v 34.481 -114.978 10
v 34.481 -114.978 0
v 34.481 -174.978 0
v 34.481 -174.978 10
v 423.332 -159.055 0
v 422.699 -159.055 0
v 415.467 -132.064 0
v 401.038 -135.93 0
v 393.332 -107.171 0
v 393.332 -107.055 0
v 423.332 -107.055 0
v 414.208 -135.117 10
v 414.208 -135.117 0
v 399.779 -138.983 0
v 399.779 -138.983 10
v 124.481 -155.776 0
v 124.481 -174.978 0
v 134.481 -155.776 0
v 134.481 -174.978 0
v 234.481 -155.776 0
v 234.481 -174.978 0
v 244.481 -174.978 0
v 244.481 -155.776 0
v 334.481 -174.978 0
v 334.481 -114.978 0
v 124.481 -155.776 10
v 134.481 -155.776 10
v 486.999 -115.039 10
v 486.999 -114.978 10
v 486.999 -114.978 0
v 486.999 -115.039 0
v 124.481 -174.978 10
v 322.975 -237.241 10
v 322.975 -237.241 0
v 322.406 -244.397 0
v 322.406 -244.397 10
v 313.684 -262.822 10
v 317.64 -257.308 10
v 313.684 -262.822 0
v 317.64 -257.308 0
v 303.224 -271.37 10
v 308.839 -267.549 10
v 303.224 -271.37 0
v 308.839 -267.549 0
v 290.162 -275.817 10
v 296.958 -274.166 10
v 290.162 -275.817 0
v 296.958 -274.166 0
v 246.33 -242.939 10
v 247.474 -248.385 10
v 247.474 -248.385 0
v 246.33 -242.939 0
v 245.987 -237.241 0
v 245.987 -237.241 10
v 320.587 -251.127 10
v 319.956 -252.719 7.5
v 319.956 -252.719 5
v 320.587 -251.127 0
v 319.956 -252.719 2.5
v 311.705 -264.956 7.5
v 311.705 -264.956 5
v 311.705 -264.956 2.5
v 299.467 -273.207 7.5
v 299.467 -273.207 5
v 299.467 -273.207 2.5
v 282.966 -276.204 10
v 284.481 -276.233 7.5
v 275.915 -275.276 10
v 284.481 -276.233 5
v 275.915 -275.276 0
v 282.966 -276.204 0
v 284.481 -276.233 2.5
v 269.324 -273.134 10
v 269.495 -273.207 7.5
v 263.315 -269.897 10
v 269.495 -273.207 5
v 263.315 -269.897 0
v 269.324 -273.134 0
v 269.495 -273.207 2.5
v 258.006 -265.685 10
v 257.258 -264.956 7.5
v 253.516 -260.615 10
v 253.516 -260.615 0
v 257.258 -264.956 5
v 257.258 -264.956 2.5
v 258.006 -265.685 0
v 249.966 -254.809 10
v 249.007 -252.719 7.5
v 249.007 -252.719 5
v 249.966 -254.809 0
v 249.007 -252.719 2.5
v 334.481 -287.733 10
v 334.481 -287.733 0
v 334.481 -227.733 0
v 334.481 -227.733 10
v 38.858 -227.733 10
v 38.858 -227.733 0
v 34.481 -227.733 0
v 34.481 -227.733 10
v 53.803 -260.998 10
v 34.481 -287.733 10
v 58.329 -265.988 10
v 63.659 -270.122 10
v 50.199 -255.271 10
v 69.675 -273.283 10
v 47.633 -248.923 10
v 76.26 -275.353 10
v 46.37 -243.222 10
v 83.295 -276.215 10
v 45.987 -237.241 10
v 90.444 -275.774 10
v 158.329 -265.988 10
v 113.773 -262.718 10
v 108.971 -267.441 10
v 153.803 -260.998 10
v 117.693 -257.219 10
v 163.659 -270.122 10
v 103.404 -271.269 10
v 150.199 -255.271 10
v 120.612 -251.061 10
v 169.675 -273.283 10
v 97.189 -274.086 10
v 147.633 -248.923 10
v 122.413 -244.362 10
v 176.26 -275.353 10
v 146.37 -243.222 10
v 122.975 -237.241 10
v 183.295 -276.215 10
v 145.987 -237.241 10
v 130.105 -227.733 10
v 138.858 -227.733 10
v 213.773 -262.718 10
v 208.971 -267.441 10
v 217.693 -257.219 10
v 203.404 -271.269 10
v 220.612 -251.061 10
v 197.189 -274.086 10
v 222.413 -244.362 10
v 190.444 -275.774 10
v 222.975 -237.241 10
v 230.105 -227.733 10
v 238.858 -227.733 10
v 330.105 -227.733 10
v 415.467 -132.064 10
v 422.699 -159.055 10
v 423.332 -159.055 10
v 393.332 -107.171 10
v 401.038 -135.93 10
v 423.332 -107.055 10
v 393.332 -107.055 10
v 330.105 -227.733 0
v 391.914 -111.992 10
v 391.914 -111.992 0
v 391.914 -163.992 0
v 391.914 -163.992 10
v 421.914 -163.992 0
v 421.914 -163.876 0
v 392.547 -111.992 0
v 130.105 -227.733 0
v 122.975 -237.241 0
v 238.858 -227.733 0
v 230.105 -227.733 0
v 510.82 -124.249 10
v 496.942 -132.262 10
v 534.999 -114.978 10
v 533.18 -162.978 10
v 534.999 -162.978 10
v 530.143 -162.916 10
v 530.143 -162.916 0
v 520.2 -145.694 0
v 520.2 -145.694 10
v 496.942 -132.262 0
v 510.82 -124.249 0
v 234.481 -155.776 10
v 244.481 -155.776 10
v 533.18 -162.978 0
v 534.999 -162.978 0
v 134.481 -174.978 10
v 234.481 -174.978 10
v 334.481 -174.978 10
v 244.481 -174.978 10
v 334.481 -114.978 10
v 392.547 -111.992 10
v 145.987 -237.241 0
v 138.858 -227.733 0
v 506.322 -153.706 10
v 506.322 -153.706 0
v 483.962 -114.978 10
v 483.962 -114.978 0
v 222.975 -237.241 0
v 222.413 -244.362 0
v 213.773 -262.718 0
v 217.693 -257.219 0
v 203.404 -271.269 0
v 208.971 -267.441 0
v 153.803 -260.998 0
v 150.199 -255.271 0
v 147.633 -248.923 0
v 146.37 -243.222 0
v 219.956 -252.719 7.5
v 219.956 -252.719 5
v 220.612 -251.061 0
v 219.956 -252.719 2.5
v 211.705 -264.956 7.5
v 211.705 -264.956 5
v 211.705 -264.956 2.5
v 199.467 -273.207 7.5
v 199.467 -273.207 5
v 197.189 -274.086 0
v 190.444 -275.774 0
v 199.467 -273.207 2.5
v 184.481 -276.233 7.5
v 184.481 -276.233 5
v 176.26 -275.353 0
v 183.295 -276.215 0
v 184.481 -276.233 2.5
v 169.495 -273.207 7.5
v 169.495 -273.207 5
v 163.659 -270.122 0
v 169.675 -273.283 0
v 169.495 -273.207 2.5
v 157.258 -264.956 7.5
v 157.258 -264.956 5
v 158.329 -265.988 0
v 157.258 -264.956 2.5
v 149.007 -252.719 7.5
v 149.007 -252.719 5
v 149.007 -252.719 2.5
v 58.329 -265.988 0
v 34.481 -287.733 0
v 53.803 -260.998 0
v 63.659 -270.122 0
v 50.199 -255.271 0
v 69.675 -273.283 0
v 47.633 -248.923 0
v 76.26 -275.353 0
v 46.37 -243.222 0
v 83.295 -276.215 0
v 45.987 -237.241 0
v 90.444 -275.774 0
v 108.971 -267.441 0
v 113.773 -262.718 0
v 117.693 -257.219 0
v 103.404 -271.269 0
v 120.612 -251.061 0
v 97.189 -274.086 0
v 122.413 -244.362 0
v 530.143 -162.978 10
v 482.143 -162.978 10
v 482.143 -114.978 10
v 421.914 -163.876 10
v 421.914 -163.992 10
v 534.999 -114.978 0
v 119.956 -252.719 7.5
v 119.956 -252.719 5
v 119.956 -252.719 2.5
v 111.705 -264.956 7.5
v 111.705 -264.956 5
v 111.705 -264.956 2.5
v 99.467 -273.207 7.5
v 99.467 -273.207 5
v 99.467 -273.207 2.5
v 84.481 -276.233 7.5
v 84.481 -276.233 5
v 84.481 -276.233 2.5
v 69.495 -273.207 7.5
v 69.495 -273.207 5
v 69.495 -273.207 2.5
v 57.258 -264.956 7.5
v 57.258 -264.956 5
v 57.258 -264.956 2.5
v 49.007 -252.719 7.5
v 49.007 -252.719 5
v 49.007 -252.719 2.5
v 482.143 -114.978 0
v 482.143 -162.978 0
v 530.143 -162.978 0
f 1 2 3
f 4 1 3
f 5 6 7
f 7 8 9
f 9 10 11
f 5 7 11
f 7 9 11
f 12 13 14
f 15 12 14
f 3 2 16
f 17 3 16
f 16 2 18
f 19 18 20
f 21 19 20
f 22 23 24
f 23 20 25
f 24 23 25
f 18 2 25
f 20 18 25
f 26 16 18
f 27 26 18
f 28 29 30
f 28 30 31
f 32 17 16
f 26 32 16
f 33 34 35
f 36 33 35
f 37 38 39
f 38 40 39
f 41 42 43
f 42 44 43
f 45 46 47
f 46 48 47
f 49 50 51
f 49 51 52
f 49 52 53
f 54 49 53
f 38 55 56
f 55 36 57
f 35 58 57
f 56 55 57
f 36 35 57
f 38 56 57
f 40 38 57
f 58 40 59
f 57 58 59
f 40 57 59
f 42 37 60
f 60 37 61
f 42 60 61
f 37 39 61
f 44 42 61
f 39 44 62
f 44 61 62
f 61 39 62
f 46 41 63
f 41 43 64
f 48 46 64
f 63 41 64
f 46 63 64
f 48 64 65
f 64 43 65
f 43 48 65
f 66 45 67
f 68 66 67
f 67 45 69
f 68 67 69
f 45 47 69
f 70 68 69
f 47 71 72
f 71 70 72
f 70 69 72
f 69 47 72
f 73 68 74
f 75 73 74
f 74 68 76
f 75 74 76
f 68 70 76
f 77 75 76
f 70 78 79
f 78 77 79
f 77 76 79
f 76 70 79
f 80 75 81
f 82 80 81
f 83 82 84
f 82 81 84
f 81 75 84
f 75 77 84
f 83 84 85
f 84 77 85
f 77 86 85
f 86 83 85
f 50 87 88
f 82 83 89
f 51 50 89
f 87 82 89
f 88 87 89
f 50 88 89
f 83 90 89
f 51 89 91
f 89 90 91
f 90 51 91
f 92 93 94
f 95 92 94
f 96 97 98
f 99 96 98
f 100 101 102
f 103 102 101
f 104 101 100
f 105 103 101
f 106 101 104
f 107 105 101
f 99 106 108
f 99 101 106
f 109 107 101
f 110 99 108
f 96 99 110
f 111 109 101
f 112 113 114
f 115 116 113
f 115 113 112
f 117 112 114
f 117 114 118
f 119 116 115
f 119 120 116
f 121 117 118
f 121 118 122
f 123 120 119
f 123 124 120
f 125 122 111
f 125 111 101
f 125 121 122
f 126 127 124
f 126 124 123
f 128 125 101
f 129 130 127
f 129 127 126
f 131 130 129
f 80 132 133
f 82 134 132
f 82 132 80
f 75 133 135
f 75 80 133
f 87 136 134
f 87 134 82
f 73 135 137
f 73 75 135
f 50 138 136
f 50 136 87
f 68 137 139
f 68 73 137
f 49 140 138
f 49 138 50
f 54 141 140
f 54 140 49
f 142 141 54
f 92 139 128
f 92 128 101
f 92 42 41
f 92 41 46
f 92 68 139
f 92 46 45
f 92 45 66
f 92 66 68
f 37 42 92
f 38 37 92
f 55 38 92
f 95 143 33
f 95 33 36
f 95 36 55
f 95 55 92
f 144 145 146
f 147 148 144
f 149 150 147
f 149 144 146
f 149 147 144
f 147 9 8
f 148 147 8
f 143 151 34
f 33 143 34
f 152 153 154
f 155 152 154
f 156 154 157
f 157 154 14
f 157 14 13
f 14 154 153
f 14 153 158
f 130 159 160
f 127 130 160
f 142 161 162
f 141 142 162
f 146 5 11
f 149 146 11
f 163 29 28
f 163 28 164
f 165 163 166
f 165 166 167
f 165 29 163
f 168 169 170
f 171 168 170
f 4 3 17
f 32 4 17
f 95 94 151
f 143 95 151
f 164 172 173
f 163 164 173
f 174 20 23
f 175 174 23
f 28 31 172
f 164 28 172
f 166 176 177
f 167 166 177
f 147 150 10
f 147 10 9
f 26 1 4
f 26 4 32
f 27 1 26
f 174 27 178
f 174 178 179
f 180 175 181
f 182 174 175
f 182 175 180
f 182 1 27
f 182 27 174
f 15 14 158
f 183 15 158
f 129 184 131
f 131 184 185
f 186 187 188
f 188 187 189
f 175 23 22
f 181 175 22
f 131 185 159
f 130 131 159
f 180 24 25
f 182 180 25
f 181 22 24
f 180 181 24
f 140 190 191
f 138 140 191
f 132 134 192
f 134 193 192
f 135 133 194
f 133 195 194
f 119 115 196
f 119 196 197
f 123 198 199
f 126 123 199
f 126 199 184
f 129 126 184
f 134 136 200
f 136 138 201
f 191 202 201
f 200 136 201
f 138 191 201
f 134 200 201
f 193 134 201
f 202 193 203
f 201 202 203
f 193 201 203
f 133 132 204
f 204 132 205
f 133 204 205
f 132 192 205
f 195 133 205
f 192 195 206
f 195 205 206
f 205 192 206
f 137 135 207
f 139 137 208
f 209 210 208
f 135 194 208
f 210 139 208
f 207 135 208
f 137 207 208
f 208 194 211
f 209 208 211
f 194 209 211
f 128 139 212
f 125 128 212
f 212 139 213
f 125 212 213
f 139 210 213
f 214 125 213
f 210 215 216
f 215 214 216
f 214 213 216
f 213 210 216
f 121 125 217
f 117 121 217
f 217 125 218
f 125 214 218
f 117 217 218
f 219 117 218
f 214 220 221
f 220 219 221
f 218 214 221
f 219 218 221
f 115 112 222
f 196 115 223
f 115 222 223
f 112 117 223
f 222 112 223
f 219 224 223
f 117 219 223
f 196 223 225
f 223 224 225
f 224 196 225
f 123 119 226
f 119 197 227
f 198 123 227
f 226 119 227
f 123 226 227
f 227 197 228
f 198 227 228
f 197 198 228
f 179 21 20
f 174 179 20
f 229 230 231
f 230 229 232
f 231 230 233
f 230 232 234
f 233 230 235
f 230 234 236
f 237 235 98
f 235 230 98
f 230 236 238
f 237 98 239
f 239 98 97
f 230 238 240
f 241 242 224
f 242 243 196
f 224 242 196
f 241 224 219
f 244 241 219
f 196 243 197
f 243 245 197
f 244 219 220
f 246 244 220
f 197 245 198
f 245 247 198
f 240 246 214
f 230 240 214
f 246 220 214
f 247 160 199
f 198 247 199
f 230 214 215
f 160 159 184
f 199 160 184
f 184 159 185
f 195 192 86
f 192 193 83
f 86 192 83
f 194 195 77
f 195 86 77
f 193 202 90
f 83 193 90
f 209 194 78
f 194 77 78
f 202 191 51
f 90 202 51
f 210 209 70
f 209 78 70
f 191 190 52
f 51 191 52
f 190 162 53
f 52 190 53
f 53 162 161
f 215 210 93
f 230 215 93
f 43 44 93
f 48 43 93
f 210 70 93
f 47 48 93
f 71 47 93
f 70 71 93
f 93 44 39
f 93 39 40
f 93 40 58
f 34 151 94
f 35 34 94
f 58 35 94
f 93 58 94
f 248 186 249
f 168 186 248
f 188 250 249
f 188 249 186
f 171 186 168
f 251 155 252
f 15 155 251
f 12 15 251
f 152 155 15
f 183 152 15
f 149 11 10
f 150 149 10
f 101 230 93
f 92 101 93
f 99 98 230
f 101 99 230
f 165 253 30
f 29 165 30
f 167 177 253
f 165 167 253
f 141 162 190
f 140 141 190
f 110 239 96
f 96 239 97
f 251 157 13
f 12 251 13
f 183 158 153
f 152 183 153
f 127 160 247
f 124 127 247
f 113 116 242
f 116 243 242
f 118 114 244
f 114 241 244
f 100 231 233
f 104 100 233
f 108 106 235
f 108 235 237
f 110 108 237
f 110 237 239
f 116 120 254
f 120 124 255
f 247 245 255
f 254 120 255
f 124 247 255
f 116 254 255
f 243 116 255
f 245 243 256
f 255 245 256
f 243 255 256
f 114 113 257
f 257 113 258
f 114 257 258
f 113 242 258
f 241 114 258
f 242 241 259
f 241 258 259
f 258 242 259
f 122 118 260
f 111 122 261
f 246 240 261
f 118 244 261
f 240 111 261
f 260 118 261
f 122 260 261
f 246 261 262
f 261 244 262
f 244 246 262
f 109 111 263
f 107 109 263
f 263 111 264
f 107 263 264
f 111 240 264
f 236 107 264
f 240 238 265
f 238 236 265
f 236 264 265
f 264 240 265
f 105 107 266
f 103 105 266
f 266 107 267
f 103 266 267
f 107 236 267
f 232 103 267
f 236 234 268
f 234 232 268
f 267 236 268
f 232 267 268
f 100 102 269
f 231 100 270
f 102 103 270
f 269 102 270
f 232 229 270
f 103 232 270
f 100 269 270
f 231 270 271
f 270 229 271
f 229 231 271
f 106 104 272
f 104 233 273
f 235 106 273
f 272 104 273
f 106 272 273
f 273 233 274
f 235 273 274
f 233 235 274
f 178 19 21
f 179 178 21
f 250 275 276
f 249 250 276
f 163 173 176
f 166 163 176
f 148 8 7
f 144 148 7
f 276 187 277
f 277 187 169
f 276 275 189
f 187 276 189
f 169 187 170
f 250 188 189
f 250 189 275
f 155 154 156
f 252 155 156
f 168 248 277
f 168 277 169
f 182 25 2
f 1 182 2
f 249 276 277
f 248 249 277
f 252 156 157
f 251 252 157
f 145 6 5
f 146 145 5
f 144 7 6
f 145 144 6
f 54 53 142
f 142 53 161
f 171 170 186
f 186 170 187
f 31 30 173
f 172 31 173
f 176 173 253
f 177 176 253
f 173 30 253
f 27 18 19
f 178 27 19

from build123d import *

# Parameters (mm, degrees)
BOSS_EXTRU_1_DEPTH   = 10
BOSS_EXTRU_1_2_DEPTH = 10
BOSS_EXTRU_1_3_DEPTH = 10
BOSS_EXTRU_1_4_DEPTH = 10
BOSS_EXTRU_1_5_DEPTH = 10
BOSS_EXTRU_1_6_DEPTH = 10


with BuildPart() as part:
    # Model → Boss.-Extru.1 (new body)
    with BuildSketch(Plane.XY):
        with BuildLine():
            Line((245.987396918, -237.241344783), (238.857836405, -227.732795114))
            Line((238.857836405, -227.732795114), (230.104537794, -227.732795114))
            Line((230.104537794, -227.732795114), (222.97495575, -237.241366315))
            add(Edge.make_bspline(
                [(222.97495575, -237.241366315), (222.977001275, -237.405180605), (222.981178453, -237.568499663), (222.981178453, -237.732809186)],
                knots=[7, 7, 7, 7, 8, 8, 8, 8], degree=3))
            add(Edge.make_bspline(
                [(222.981178453, -237.732809186), (222.981178453, -258.995766271), (205.744138421, -276.232806304), (184.481181335, -276.232806304)],
                knots=[8, 8, 8, 8, 9, 9, 9, 9], degree=3))
            add(Edge.make_bspline(
                [(184.481181335, -276.232806304), (163.21822425, -276.232806304), (145.981184218, -258.995766271), (145.981184218, -237.732809186)],
                knots=[9, 9, 9, 9, 10, 10, 10, 10], degree=3))
            add(Edge.make_bspline(
                [(145.981184218, -237.732809186), (145.981184218, -237.568499663), (145.985361396, -237.405180605), (145.987406921, -237.241344783)],
                knots=[10, 10, 10, 10, 11, 11, 11, 11], degree=3))
            Line((145.987406921, -237.241344783), (138.857846408, -227.732795114))
            Line((138.857846408, -227.732795114), (130.104547797, -227.732795114))
            Line((130.104547797, -227.732795114), (122.974965752, -237.241366315))
            add(Edge.make_bspline(
                [(122.974965752, -237.241366315), (122.977011278, -237.405180605), (122.981188456, -237.568499663), (122.981188456, -237.732809186)],
                knots=[14, 14, 14, 14, 15, 15, 15, 15], degree=3))
            add(Edge.make_bspline(
                [(122.981188456, -237.732809186), (122.981188456, -258.995766271), (105.744148424, -276.232806304), (84.481191338, -276.232806304)],
                knots=[15, 15, 15, 15, 16, 16, 16, 16], degree=3))
            add(Edge.make_bspline(
                [(84.481191338, -276.232806304), (63.218212721, -276.232806304), (45.981172689, -258.995766271), (45.981172689, -237.732809186)],
                knots=[16, 16, 16, 16, 17, 17, 17, 17], degree=3))
            add(Edge.make_bspline(
                [(45.981172689, -237.732809186), (45.981172689, -237.568478131), (45.985349867, -237.405180605), (45.987395393, -237.241344783)],
                knots=[17, 17, 17, 17, 18, 18, 18, 18], degree=3))
            Line((45.987395393, -237.241344783), (38.85783488, -227.732795114))
            Line((38.85783488, -227.732795114), (34.481185574, -227.732795114))
            Line((34.481185574, -227.732795114), (34.481185574, -287.732793419))
            Line((34.481185574, -287.732793419), (334.481177097, -287.732793419))
            Line((334.481177097, -287.732793419), (334.481177097, -227.732795114))
            Line((334.481177097, -227.732795114), (330.104570855, -227.732795114))
            Line((330.104570855, -227.732795114), (322.974945747, -237.241366315))
            add(Edge.make_bspline(
                [(322.974945747, -237.241366315), (322.977012804, -237.405180605), (322.981189982, -237.568499663), (322.981189982, -237.732809186)],
                knots=[0, 0, 0, 0, 1, 1, 1, 1], degree=3))
            add(Edge.make_bspline(
                [(322.981189982, -237.732809186), (322.981189982, -258.995766271), (305.744128418, -276.232806304), (284.481171332, -276.232806304)],
                knots=[1, 1, 1, 1, 2, 2, 2, 2], degree=3))
            add(Edge.make_bspline(
                [(284.481171332, -276.232806304), (263.218214247, -276.232806304), (245.981174215, -258.995766271), (245.981174215, -237.732809186)],
                knots=[2, 2, 2, 2, 3, 3, 3, 3], degree=3))
            add(Edge.make_bspline(
                [(245.981174215, -237.732809186), (245.981174215, -237.568478131), (245.985351393, -237.405180605), (245.987396918, -237.241344783)],
                knots=[3, 3, 3, 3, 4, 4, 4, 4], degree=3))
        make_face()
    extrude(amount=BOSS_EXTRU_1_DEPTH)


with BuildPart() as body_2:
    # Model → Boss.-Extru.1 2 (new body)
    with BuildSketch(Plane.XY):
        Polygon((414.207509549, -135.116985438), (399.778889826, -138.983136188), (392.546643935, -111.992040369), (391.91360764, -111.992040369), (391.91360764, -163.992031723), (421.91358526, -163.992031723), (421.91358526, -163.876470301), align=None)
    extrude(amount=BOSS_EXTRU_1_2_DEPTH)


with BuildPart() as body_3:
    # Model → Boss.-Extru.1 3 (new body)
    with BuildSketch(Plane.XY):
        Polygon((401.03807516, -135.93039288), (415.466694883, -132.064242129), (422.698940776, -159.055337947), (423.331977072, -159.055337947), (423.331977067, -107.055346593), (393.331999447, -107.055346596), (393.331999447, -107.170908018), align=None)
    extrude(amount=BOSS_EXTRU_1_3_DEPTH)


with BuildPart() as body_4:
    # Model → Boss.-Extru.1 4 (new body)
    with BuildSketch(Plane.XY):
        Polygon((34.481185574, -114.977779473), (34.481185574, -174.977777778), (124.481183031, -174.977777778), (124.481183031, -164.977785238), (124.481183031, -155.776387363), (134.481175571, -155.776387363), (134.481175571, -164.977785238), (134.481175571, -174.977777778), (234.4811871, -174.977777778), (234.4811871, -164.977785238), (234.4811871, -155.776387363), (244.48117964, -155.776387363), (244.48117964, -164.977785238), (244.48117964, -174.977777778), (334.481177097, -174.977777778), (334.481177097, -114.977779473), align=None)
    extrude(amount=BOSS_EXTRU_1_4_DEPTH)


with BuildPart() as body_5:
    # Model → Boss.-Extru.1 5 (new body)
    with BuildSketch(Plane.XY):
        Polygon((520.199535285, -145.693970913), (506.321958584, -153.706186422), (483.96212616, -114.977779473), (482.142857361, -114.977779473), (482.142857361, -162.977778117), (530.142856005, -162.977778117), (530.142856005, -162.916304694), align=None)
    extrude(amount=BOSS_EXTRU_1_5_DEPTH)


with BuildPart() as body_6:
    # Model → Boss.-Extru.1 6 (new body)
    with BuildSketch(Plane.XY):
        Polygon((496.942097239, -132.261586678), (510.819673939, -124.249371168), (533.179506367, -162.977778115), (534.998775166, -162.977778115), (534.998775161, -114.977779471), (486.998776518, -114.977779475), (486.998776518, -115.039252898), align=None)
    extrude(amount=BOSS_EXTRU_1_6_DEPTH)


solid = Compound([part.part, body_2.part, body_3.part, body_4.part, body_5.part, body_6.part])
